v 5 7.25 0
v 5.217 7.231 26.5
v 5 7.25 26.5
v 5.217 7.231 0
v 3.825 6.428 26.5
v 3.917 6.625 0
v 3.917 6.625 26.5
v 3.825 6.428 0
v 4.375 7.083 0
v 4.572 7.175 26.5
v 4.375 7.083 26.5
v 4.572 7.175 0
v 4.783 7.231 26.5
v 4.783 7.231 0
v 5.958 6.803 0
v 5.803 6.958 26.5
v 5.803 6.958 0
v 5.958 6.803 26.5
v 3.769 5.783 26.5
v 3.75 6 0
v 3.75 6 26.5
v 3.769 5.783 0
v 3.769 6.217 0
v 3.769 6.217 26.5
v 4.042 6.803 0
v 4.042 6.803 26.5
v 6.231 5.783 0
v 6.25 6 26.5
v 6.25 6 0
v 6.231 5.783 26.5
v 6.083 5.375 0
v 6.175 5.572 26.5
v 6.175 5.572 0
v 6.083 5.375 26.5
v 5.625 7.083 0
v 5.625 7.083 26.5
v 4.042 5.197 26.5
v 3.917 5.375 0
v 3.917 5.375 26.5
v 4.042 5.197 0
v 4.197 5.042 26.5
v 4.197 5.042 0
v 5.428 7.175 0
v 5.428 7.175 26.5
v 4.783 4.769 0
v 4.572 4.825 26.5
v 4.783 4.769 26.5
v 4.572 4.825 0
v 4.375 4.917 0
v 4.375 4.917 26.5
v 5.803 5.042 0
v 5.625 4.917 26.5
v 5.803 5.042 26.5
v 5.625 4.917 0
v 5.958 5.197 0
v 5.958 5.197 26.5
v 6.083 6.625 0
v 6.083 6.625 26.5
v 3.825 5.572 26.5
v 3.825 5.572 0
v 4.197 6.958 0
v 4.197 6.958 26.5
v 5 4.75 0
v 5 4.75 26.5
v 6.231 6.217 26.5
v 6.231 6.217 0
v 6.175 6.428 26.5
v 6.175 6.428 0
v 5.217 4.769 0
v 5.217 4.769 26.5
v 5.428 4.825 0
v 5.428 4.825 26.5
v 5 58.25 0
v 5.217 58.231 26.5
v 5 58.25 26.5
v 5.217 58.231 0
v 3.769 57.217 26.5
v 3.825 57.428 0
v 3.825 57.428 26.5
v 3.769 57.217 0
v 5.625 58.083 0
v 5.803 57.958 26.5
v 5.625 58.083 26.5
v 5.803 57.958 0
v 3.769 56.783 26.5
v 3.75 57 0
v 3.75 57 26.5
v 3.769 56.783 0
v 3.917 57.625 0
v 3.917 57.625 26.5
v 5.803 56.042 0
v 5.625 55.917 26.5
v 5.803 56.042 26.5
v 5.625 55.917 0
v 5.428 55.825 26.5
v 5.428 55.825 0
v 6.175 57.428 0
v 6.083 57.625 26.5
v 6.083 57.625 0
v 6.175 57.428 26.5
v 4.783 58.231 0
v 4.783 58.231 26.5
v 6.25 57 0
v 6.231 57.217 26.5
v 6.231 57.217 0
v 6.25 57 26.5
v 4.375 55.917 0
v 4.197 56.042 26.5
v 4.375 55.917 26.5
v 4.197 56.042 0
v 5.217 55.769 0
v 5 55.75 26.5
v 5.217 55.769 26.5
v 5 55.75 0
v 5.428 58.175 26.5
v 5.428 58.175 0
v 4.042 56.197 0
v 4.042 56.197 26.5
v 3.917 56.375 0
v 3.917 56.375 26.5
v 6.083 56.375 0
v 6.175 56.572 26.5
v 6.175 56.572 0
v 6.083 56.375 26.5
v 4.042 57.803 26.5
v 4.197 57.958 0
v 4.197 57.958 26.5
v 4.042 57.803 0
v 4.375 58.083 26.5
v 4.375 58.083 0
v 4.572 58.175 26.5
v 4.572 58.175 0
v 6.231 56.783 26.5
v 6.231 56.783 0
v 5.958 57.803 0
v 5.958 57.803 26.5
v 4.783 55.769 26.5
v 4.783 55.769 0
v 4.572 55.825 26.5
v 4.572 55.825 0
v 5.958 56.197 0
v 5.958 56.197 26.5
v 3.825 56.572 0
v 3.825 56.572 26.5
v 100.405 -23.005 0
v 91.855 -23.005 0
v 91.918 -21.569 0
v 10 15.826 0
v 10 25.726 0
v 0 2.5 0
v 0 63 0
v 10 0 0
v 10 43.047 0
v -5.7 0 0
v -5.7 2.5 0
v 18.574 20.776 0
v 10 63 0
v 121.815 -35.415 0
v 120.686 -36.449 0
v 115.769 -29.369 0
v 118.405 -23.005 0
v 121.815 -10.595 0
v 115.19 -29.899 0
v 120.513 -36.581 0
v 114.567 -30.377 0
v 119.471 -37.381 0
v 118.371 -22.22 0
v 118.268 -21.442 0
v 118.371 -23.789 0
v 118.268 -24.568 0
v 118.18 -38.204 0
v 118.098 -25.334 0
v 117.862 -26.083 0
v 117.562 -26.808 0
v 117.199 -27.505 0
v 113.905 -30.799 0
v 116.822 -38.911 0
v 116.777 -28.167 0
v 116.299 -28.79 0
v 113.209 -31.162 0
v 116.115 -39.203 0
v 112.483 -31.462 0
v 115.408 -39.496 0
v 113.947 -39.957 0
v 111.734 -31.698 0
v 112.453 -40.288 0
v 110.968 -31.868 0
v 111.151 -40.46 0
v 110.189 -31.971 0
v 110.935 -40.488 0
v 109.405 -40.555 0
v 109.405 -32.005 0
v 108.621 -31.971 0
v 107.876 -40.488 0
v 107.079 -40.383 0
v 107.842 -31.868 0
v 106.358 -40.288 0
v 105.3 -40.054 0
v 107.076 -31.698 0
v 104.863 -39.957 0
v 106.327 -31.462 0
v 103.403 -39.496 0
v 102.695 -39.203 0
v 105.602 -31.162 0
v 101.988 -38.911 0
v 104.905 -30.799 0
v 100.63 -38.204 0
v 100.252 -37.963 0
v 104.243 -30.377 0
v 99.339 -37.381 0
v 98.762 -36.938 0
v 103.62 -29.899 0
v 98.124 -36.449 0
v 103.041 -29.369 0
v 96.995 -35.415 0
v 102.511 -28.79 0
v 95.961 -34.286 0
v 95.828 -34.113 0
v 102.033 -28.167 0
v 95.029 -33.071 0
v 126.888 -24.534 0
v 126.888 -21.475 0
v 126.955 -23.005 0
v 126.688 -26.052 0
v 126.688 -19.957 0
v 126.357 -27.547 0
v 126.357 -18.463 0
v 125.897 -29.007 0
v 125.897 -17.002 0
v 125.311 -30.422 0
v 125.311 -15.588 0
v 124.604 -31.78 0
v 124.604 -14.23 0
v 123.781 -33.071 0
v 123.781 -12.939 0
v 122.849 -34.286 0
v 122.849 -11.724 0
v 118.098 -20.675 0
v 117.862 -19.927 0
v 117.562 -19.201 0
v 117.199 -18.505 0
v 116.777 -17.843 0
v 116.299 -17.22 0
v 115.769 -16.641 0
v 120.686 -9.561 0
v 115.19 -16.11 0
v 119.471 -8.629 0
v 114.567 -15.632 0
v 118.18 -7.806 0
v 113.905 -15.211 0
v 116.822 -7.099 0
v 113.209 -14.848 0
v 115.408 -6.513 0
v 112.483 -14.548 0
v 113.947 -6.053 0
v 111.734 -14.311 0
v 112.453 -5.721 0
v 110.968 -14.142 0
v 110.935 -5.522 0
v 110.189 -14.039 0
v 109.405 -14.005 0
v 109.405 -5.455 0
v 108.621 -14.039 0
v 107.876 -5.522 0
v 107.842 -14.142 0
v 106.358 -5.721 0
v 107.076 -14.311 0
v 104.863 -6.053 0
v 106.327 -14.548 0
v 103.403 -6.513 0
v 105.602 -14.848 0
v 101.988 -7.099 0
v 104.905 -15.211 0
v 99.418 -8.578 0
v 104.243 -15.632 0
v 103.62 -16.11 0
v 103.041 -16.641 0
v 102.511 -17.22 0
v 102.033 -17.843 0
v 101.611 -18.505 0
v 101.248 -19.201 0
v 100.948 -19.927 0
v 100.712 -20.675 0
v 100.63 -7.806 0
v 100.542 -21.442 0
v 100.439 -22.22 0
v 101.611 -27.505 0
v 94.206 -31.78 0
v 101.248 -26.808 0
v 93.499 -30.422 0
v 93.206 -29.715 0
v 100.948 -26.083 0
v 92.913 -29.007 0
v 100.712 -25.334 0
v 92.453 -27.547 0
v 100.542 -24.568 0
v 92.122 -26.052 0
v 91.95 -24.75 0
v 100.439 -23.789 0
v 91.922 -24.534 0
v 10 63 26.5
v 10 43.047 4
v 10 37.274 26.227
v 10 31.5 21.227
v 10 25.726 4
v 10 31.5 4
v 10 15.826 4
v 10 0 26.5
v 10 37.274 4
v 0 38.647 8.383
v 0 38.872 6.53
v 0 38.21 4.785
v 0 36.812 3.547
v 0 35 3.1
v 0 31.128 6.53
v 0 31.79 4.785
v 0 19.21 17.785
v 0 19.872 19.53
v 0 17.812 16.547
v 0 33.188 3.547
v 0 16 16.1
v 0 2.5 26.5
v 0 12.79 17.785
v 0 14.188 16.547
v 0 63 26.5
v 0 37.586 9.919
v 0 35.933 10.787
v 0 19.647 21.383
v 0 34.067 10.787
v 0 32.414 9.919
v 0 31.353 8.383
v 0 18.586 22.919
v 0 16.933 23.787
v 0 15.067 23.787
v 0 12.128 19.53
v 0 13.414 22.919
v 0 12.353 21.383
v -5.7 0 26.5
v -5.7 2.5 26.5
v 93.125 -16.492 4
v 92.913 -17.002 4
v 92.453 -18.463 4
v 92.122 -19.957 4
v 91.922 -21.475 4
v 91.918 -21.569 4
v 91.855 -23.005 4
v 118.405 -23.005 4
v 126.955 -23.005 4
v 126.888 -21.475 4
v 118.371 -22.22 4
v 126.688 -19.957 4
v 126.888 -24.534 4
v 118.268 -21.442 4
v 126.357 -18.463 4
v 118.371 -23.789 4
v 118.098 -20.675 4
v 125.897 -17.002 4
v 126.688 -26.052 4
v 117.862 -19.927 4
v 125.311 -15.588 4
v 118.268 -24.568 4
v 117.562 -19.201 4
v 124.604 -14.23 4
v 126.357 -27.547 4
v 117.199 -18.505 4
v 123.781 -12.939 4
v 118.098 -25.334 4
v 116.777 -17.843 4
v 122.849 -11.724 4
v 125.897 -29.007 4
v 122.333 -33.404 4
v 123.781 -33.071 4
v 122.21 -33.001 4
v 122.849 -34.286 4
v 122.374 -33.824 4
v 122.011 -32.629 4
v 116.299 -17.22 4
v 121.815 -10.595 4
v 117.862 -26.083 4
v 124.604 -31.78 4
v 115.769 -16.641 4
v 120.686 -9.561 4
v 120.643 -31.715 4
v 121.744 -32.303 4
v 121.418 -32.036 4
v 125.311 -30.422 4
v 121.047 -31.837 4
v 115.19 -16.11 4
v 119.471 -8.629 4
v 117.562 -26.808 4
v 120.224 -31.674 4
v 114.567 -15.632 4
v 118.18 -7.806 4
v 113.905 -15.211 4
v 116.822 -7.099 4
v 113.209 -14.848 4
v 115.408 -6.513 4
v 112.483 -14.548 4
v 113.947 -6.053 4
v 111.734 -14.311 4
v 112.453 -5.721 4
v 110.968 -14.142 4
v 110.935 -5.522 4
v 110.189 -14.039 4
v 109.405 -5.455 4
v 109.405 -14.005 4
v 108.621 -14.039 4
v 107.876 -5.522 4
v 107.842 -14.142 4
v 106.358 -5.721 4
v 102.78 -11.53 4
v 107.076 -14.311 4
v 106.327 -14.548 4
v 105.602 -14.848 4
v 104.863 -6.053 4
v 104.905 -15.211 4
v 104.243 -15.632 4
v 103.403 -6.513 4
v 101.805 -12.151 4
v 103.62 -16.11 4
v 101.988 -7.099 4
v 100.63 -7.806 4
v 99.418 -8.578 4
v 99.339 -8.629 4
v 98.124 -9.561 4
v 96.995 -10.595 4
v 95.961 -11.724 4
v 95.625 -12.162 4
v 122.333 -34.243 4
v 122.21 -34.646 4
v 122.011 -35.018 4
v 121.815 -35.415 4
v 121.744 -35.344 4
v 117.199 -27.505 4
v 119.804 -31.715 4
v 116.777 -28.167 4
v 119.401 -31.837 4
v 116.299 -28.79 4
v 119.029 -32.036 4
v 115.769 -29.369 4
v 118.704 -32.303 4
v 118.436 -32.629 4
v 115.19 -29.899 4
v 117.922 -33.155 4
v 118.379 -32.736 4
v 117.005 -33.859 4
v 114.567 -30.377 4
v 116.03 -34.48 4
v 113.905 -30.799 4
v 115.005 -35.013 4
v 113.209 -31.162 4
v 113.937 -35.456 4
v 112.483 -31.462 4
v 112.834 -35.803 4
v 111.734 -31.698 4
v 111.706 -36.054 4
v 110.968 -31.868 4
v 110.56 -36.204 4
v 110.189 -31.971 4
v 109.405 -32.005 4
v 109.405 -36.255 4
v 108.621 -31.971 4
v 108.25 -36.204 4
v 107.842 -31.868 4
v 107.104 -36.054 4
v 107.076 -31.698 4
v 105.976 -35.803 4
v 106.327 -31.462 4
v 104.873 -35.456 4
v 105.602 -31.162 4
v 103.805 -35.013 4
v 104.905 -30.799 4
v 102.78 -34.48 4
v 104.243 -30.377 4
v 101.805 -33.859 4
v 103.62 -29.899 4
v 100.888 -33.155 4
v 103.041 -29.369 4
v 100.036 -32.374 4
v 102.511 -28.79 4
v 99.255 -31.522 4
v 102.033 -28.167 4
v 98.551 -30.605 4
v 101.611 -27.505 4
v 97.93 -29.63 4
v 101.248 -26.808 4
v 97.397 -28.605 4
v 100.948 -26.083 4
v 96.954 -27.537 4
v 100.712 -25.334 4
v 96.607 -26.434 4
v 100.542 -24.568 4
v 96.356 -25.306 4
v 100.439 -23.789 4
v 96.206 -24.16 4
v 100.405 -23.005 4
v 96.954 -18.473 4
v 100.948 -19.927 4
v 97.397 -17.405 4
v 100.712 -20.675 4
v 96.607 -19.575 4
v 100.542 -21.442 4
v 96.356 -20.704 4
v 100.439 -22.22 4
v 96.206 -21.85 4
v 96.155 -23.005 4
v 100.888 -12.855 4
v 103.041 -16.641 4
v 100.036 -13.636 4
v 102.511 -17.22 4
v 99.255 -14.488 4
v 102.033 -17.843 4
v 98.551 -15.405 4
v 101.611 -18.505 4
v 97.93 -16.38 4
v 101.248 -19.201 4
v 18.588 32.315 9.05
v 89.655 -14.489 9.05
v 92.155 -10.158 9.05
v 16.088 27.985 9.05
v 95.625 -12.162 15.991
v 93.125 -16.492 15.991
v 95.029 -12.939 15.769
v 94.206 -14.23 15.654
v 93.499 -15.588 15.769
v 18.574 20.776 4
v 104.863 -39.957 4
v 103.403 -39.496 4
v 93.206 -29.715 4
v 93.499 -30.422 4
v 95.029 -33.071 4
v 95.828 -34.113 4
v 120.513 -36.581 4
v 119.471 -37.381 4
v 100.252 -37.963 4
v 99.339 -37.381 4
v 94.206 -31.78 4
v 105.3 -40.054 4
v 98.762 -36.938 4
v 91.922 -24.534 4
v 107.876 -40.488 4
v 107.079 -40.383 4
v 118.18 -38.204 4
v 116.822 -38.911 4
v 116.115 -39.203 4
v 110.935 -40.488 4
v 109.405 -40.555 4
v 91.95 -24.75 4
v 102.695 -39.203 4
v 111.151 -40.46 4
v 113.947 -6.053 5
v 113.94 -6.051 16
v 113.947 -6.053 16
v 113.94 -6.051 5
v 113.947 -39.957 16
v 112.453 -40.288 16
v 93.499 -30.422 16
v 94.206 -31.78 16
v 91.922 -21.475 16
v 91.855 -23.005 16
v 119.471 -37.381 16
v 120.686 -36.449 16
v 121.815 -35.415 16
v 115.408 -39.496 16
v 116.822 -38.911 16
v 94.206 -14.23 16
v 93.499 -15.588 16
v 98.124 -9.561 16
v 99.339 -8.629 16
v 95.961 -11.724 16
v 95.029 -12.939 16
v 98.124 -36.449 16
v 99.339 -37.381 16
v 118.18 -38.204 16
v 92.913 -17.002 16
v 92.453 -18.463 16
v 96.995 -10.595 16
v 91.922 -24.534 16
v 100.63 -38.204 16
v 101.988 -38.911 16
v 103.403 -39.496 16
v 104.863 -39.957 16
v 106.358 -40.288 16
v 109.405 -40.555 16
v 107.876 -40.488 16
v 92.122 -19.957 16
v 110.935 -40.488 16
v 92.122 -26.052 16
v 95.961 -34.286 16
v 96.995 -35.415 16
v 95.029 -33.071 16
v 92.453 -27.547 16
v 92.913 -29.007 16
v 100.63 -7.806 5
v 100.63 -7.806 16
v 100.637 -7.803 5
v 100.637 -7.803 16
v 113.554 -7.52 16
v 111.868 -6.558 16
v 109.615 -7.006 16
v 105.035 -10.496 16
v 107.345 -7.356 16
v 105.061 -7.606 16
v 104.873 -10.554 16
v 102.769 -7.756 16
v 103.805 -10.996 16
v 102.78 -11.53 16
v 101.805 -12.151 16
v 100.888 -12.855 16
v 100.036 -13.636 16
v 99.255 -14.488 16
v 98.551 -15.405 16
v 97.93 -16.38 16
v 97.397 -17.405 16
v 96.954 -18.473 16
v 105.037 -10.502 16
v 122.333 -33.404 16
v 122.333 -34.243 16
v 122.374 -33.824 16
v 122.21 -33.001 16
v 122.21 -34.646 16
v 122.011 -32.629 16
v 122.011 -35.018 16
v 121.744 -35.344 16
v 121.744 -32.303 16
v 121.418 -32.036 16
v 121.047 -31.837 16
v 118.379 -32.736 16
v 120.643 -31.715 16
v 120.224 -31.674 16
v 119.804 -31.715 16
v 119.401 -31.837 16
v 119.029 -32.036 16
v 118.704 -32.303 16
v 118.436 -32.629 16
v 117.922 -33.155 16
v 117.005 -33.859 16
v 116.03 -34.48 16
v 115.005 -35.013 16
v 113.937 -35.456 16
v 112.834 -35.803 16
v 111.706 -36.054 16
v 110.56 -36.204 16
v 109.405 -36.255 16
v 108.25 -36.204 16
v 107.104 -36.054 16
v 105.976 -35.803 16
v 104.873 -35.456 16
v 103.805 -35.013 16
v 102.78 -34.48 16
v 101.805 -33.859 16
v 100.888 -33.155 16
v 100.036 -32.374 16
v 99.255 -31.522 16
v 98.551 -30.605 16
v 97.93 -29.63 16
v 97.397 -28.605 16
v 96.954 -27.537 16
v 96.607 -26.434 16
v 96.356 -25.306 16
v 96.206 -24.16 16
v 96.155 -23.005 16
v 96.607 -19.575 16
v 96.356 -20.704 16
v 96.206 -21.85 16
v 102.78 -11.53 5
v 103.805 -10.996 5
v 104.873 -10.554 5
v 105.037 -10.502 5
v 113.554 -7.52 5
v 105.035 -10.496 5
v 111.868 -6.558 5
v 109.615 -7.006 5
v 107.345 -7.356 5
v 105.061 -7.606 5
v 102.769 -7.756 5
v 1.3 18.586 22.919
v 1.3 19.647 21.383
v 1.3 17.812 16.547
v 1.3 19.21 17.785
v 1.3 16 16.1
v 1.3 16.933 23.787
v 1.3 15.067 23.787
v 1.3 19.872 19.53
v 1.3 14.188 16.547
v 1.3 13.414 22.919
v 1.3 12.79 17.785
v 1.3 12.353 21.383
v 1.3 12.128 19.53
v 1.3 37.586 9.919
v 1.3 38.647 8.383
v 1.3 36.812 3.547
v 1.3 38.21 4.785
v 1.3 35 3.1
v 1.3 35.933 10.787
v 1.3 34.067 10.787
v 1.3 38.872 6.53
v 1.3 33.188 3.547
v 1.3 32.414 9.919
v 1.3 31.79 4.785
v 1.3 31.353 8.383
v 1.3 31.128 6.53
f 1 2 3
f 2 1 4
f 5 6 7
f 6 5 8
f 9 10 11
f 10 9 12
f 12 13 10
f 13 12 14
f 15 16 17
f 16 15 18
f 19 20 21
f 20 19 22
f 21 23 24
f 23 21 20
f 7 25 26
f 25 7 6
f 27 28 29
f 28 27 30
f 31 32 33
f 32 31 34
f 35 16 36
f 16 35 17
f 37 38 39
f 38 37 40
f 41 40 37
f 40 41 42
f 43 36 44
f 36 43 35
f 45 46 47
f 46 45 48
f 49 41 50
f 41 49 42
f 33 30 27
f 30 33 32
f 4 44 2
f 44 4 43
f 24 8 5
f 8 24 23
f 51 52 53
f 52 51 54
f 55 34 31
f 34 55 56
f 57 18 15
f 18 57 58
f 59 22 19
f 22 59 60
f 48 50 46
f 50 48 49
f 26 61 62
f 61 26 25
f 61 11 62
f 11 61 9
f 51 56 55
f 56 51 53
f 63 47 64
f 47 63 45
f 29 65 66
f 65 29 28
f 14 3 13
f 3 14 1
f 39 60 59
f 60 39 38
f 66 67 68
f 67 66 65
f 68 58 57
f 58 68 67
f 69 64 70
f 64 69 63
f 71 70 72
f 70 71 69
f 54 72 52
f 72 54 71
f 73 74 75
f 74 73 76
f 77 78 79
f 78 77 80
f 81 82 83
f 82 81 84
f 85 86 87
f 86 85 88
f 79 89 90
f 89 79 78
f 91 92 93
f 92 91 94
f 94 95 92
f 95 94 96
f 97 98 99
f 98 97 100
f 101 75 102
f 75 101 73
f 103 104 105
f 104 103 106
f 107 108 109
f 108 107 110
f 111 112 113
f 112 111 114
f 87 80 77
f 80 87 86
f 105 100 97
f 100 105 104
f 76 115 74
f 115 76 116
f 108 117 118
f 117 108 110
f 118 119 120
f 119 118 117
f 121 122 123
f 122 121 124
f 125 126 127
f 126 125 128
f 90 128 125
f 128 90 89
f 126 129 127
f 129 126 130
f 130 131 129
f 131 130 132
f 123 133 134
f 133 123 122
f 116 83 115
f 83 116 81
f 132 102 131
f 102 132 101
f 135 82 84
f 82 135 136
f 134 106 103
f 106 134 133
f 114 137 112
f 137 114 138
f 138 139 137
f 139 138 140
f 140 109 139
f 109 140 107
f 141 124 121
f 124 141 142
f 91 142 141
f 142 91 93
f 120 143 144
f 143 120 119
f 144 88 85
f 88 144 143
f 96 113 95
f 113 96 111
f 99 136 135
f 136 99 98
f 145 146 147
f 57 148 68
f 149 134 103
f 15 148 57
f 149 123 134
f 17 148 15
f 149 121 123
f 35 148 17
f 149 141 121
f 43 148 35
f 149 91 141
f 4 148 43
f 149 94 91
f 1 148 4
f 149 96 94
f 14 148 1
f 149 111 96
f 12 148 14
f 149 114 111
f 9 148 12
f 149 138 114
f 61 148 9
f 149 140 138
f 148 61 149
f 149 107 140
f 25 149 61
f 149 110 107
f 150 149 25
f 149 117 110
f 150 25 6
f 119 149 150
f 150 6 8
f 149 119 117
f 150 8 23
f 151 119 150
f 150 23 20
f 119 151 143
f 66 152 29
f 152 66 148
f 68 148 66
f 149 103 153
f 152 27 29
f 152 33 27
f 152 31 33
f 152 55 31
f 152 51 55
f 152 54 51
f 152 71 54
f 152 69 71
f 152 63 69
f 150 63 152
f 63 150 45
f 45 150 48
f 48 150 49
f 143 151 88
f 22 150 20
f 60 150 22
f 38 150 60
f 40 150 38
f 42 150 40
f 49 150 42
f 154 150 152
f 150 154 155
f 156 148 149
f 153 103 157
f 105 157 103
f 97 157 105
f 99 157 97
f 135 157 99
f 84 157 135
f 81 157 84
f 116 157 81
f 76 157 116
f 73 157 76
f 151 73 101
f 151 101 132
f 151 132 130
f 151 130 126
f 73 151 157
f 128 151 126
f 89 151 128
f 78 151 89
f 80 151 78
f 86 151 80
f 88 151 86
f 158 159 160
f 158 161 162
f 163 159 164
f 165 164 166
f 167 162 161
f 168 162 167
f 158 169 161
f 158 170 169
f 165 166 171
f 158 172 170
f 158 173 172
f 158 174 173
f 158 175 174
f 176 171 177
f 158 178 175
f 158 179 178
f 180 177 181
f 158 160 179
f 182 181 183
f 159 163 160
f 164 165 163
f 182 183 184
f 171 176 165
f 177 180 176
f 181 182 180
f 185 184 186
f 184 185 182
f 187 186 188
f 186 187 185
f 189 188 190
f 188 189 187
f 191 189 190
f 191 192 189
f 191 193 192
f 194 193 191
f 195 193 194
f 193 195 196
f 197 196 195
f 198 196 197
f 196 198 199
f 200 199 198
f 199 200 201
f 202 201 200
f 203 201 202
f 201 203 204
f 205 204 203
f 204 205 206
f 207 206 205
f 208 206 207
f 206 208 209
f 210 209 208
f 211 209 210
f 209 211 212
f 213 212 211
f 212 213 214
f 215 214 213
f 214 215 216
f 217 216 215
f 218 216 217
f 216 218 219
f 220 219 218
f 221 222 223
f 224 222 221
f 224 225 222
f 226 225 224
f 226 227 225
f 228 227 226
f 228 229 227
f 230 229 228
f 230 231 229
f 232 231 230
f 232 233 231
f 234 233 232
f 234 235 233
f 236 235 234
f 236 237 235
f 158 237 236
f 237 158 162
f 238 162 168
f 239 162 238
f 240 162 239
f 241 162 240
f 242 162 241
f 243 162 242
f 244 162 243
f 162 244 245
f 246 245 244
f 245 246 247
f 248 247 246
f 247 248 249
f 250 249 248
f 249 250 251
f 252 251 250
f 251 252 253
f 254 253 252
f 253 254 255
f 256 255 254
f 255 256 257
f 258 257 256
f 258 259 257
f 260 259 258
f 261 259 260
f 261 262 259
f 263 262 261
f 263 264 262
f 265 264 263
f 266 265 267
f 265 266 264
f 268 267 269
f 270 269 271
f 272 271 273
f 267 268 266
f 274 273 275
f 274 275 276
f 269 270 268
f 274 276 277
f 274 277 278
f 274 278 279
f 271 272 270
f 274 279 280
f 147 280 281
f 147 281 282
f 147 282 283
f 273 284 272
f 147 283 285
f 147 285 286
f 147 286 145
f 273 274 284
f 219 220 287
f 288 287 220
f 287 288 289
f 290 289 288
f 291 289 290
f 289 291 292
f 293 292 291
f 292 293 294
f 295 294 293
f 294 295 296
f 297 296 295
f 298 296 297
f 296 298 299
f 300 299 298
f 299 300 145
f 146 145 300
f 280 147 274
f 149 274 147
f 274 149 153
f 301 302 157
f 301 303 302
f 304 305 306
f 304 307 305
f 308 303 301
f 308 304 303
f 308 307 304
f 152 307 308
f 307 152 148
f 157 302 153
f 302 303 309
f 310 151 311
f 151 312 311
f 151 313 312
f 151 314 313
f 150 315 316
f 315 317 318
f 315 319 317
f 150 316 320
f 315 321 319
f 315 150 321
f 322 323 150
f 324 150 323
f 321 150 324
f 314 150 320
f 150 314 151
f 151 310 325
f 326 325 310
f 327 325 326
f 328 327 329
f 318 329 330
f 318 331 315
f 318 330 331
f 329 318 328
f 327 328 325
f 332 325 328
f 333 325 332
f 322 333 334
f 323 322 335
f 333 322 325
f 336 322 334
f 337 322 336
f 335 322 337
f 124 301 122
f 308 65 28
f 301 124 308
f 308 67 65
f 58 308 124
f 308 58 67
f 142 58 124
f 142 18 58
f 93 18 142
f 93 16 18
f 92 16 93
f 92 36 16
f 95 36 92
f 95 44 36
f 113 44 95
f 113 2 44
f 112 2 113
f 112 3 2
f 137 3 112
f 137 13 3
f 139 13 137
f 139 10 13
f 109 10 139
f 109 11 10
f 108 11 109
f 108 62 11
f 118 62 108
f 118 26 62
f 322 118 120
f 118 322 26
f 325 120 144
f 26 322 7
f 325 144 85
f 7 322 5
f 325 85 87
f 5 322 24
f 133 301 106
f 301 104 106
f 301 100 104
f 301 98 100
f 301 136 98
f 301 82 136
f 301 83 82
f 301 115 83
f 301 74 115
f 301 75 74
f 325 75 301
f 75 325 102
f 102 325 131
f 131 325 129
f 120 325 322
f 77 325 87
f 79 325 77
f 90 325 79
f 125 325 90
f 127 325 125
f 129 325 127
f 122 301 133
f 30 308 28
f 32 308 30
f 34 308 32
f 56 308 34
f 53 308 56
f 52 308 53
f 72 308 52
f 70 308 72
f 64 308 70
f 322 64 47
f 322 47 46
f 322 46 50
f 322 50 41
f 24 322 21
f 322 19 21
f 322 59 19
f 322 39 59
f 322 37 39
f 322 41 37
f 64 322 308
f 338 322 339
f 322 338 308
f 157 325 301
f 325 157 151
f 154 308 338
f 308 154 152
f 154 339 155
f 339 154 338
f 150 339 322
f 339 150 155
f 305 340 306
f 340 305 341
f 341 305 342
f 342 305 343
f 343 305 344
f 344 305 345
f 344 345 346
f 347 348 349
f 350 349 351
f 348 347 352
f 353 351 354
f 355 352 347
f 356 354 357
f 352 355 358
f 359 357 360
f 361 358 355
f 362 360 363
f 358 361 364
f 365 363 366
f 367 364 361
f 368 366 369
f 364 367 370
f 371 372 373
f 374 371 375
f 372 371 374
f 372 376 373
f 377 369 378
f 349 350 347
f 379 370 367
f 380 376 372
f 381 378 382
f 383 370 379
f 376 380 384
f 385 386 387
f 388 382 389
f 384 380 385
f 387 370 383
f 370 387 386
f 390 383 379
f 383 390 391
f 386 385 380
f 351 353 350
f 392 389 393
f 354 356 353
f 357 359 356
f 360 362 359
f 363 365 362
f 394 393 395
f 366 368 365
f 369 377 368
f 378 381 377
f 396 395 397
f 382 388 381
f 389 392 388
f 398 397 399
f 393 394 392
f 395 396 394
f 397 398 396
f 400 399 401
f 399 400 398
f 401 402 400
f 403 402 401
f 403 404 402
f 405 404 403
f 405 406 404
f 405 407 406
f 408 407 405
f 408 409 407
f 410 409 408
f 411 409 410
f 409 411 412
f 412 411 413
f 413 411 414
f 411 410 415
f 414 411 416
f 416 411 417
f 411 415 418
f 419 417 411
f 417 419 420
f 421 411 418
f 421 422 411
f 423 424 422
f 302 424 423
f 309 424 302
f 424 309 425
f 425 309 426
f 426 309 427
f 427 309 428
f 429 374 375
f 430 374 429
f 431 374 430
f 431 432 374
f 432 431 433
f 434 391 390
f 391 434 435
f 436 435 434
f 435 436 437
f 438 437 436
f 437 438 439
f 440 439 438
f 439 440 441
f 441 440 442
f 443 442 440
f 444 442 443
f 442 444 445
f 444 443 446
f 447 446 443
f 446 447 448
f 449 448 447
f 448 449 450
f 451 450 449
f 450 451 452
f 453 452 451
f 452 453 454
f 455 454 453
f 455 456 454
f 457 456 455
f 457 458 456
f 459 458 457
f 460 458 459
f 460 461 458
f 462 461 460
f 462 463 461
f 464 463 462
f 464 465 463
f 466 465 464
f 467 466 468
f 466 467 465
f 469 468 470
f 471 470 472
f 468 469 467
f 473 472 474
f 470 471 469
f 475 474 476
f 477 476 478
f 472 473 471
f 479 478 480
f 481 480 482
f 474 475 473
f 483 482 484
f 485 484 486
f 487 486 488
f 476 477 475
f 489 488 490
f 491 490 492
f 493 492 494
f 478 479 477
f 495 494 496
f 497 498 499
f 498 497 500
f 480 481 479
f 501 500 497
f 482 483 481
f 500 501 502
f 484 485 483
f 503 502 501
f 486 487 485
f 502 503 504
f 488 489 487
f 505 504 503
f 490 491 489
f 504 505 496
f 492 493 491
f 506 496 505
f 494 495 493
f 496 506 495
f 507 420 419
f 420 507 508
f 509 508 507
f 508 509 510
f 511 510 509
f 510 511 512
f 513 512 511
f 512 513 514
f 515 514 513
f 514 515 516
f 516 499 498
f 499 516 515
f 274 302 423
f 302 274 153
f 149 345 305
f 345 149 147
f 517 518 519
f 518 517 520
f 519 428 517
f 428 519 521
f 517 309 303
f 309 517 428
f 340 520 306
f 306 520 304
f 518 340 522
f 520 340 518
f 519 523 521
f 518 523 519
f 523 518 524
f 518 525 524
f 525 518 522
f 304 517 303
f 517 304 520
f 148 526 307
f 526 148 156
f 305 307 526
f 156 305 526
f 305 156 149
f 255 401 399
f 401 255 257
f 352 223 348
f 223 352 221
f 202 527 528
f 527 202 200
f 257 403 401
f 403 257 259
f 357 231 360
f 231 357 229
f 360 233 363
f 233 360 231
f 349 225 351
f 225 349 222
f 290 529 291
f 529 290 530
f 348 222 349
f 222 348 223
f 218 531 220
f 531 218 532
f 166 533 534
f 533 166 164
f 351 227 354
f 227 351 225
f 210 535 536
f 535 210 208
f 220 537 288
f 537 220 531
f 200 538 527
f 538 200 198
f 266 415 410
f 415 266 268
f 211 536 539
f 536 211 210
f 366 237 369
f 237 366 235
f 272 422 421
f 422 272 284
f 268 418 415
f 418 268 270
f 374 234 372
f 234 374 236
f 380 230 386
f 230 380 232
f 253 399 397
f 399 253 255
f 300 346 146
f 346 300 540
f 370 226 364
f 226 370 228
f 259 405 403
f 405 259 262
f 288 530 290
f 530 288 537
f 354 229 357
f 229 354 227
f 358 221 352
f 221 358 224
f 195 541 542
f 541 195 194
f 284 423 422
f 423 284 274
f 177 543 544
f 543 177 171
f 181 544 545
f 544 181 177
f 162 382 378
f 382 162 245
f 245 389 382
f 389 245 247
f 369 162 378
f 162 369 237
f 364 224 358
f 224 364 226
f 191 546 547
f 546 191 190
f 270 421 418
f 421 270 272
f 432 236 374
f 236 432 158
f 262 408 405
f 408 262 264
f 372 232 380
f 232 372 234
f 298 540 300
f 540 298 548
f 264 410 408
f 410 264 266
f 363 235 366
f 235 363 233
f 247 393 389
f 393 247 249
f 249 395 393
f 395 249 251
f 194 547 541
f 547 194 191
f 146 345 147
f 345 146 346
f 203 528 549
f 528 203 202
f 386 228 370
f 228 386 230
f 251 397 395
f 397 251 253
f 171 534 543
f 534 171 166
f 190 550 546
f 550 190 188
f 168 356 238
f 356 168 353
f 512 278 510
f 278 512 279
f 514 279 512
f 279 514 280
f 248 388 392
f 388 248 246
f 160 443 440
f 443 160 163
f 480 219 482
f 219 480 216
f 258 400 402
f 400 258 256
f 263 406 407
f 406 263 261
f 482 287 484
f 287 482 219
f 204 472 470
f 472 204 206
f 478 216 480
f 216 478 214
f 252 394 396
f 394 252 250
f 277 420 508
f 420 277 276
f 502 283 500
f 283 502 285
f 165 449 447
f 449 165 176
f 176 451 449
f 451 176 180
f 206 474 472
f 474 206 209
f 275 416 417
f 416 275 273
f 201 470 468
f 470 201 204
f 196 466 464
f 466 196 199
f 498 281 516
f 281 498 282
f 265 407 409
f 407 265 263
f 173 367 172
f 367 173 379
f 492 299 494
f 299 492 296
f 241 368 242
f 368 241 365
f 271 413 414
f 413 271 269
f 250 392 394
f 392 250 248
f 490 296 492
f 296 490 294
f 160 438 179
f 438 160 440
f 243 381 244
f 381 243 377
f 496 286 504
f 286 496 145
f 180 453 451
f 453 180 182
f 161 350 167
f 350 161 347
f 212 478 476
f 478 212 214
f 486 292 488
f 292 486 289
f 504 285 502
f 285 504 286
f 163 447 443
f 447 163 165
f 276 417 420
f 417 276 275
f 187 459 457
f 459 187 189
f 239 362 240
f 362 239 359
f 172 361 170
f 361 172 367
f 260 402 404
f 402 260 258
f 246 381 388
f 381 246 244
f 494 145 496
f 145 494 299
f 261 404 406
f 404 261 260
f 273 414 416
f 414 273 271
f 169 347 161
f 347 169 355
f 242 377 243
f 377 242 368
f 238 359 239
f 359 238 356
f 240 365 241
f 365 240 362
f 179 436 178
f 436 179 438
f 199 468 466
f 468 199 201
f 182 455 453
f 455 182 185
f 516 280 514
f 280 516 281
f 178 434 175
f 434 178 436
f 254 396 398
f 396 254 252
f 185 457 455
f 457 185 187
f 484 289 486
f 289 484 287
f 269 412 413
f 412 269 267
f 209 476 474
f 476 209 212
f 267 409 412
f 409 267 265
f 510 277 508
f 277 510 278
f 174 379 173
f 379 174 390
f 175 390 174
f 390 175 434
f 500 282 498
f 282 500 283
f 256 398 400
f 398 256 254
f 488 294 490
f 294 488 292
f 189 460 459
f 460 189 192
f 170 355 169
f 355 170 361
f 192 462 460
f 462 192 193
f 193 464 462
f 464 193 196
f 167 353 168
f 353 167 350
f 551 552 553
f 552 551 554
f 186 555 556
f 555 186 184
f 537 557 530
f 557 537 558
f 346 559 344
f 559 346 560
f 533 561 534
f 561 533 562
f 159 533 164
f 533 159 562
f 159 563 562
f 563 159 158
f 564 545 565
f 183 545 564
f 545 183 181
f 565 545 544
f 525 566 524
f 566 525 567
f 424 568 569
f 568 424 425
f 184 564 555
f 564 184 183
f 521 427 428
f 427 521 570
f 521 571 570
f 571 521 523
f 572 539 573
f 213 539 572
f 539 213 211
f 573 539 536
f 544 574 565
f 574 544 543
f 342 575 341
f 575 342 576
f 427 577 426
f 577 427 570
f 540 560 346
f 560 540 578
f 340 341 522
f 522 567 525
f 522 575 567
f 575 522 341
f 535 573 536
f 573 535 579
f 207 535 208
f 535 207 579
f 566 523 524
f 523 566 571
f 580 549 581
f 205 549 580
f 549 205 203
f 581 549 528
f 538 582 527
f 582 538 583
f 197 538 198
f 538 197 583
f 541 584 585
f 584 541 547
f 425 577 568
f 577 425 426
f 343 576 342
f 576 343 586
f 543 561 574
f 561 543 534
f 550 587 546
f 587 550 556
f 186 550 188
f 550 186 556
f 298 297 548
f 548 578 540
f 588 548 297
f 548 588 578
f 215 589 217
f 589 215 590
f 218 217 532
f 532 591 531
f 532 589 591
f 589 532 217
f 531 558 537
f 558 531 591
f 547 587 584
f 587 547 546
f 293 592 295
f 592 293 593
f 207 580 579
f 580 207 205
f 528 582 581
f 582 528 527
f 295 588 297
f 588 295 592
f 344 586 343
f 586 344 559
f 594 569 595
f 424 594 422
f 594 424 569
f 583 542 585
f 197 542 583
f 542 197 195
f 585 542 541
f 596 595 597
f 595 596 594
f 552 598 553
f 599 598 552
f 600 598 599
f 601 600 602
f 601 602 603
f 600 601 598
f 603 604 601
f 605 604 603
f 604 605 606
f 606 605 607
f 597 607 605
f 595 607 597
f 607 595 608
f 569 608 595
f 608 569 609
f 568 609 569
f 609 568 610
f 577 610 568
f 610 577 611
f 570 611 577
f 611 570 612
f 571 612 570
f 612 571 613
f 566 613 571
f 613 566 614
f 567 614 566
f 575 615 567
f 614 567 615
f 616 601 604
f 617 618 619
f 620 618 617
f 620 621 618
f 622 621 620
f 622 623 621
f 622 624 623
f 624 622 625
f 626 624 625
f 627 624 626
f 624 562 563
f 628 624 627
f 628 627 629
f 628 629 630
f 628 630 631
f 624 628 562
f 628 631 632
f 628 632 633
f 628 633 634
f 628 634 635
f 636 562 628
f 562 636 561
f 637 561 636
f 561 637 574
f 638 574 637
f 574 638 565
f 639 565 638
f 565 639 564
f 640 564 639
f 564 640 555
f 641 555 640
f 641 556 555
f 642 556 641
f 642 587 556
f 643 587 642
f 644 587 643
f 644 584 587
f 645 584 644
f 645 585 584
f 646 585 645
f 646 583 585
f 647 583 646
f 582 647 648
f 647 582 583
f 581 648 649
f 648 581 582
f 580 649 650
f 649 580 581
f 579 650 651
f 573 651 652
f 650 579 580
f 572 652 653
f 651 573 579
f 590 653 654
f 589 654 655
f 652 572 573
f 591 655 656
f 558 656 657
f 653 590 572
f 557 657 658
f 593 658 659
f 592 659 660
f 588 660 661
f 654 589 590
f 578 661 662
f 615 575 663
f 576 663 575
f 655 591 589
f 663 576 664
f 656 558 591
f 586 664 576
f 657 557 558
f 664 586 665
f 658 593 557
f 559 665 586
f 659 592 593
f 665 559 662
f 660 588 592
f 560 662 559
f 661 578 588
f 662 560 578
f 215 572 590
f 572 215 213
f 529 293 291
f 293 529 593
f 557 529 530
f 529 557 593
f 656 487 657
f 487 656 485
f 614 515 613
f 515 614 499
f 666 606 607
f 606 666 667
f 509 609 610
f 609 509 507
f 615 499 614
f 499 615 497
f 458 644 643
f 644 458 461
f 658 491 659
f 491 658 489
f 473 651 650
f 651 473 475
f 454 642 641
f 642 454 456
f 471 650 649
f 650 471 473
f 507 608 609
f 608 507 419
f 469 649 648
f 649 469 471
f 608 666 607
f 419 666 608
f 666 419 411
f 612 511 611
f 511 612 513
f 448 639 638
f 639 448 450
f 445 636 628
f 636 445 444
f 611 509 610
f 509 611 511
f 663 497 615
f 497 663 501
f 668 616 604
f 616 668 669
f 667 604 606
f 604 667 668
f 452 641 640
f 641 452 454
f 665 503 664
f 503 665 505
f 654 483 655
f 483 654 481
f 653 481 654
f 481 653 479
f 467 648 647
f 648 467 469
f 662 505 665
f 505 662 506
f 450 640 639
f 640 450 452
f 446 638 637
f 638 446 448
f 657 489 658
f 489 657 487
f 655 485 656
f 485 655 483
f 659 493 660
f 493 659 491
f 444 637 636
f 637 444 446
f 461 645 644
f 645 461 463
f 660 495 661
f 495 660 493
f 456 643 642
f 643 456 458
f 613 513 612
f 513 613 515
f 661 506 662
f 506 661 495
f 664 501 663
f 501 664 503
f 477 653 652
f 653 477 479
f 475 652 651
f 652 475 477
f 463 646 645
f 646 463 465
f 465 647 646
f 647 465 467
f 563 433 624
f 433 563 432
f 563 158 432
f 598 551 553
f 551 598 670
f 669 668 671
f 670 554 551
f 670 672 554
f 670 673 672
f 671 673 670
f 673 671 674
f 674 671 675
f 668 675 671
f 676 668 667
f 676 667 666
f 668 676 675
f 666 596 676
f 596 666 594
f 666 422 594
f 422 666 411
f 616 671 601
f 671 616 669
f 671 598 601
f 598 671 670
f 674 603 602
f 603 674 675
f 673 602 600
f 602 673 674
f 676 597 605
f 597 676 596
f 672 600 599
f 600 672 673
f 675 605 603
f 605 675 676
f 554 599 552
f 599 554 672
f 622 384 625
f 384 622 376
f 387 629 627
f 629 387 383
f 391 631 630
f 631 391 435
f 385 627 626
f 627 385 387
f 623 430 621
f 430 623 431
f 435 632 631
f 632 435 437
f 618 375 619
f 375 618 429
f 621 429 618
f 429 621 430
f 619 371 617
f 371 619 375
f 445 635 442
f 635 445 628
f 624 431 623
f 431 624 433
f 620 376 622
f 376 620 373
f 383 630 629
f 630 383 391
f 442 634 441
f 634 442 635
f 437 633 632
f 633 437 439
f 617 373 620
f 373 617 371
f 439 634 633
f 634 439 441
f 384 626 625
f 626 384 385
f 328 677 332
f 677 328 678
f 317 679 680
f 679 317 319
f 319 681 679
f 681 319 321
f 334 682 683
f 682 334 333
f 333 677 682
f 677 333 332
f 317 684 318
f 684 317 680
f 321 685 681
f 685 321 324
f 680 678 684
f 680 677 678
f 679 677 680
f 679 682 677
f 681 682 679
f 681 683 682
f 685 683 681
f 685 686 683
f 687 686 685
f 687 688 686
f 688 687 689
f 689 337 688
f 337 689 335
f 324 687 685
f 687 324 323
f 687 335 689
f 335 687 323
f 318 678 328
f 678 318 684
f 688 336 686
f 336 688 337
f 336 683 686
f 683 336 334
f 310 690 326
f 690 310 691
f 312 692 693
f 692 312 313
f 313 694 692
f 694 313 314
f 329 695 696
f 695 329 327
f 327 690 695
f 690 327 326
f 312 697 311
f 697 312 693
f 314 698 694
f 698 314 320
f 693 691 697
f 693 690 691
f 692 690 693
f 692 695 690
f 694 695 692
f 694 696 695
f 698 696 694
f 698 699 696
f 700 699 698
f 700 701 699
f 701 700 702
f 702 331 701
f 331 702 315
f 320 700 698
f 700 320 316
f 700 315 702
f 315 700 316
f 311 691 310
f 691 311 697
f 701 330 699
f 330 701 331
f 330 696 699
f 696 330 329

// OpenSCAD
// [FL_INDEX: keywords="openscad, 3d_parametric, Customizable_solidoodle_alternative_snap_spool_holder, csg_solid" | COT="Parametric OpenSCAD design from 3DCodeverse"]
// Title: Customizable solidoodle alternative snap spool holder

part = "lt"; // [rt:Right tower,lt:Left tower,orb:Outer right bracket,olb:Outer left bracket,irb:Inner right bracket,ilb:Inner left bracket,rtb:Right tower with bracket,ltb:Left tower with bracket]

// How you plan to mount the holder
positioning = 1; // [0:Anywhere along top frame,1:Flush against back (notched brackets)]

// Extra length for back lip, when positioning is flush against back
back_lip_extra_length = 2; // [0:5]

// Arm length; pipe distance from top of printer is arm_length*cos(arm_angle) - clip_inner_diameter/2
arm_length = 122;  // [110:180]
// Arm inclination (towards back); default 30
arm_angle = 30; // [5:45]

// Length of base
base_size = 63;  // [63:73]

// Inner diameter of pipe clip
clip_inner_diameter = 26.5; // [26.4:.75in pipe (tight),26.7:.75in pipe (exact),33.2:1in pipe (tight),33.4:1in pipe (exact)]
// Thickness of pipe clip; must be smaller or equal to clip head thickness (keep larger than 4)
clip_thickness = 8.6;
// Diameter of clip end hole
clip_head_inner_diameter = 18; // [0:23]
// Clip end rim size
clip_head_rim_thickness = 0; // [0:10]
// Clip lip thickness
clip_edge_thickness = 1.5;
// Clip rotation; you may want to adjust if you change arm_angle (30-arm_angle will keep gap orientation unchanged)
clip_angle = 0; // [-20:30]
// Clip lip curvature multiplier (1 to 3 recommended; higher is less curved)
clip_lip_curvature = 1.5;
// Arm side buttress base width; may want to adjust if you change arm angle
arm_buttress_width = 10; // [3:15]

/* [Hidden] */

back_pos = (positioning != 0);

// Base parameters
base_d = base_size;
base_h = 10;
base_w = 26.5;
screw_r = 1.25;
screw_dist = 51;

// Arm parameters
arm_len = arm_length;
arm_thk = 4;
arm_w = 15;
arm_rib = 5;
//arm_angle = 30;
arm_butt_w = arm_buttress_width;


// Clip parameters
clip_h = 4;
clip_od = clip_inner_diameter + clip_thickness + clip_head_rim_thickness;
clip_id = clip_head_inner_diameter;
lip_h = 16;  // includes clip_h
lip_od = clip_inner_diameter + clip_thickness;
lip_id = clip_inner_diameter;
lip_edge_thk = clip_edge_thickness;
lip_phi = 120;
lip_dphi = 75 + clip_angle;
lip_gap_phi = 45;
lip_gap_dphi = lip_dphi - lip_gap_phi;
lip_gap_h = 1;
lip_shave_r = lip_od*clip_lip_curvature;

// Solidoodle frame
sd_slack = 0.2;
sd_frame_thk = 1 + sd_slack;   // sheet metal
sd_toph_w = 26 + sd_slack;  // horizontal
sd_backv_w = 45.5 + sd_slack;  // vertical

rivet_r = 6.3/2 + 0.75;
rivet_h = 1 + 0.3;

// Bracket parameters
bracket_len = base_d;
bracket_thk = 2.5;
bracket_screw_r = 1.75;
bracket_screw_head_r = 2.75;
bracket_screw_head_h = 1.25;
bracket_screw_hole_dist = screw_dist;
bracket_screw_hole_ofs = 5;

// Extra
back_lip_len = bracket_thk + sd_frame_thk + back_lip_extra_length;  // same as inner bracket width

// phi <= 180
module cylinder_hollow(h, od, id, phi, d_phi=0) {
  rotate([0,0,d_phi]) difference() {
    cylinder(h, od/2, od/2, $fn=72);
    translate([0,0,-0.1]) cylinder(h+0.2, id/2, id/2, $fn=72);
    if (phi != 0) {
      translate([0,0,-0.1]) linear_extrude(height=h+0.2, twist=0) polygon([[0,0], [od,0], [cos(phi/2)*od, sin(phi/2)*od], [cos(phi)*od, sin(phi)*od]], convexity=2);
    }
  }
}

// phi <= 180
module cylinder_hollow_n(h, od, id, phi, d_phi=0) {
  rotate([0,0,d_phi]) intersection() {
    difference() {
      cylinder(h, od/2, od/2, $fn=72);
      translate([0,0,-0.1]) cylinder(h+0.2, id/2, id/2, $fn=72);
    }
    translate([0,0,-0.1]) linear_extrude(height=h+0.2, twist=0) polygon([[0,0], [od,0], [cos(phi/2)*od, sin(phi/2)*od], [cos(phi)*od, sin(phi)*od]], convexity=2);
  }
}

module buttress_w(thk, w, phi) {
  h = w*tan(phi);
  linear_extrude(height=thk, twist=0) polygon([[0,0],[w,0],[w,h]], convexity=2);
}

module buttress_h(thk, h, phi) {
  w = h/tan(phi);
  linear_extrude(height=thk, twist=0) polygon([[0,0],[w,0],[w,h]], convexity=2);
}




module base(lt_holes=true, rt_holes=true) {
  difference() {
    cube([base_w, base_d, base_h]);
    if (rt_holes) {
      translate([-1, (base_d-screw_dist)/2, base_h/2]) rotate([0,90,0]) cylinder(base_w/2+1+1,screw_r,screw_r, $fn=36);
      translate([-1, (base_d+screw_dist)/2, base_h/2]) rotate([0,90,0]) cylinder(base_w/2+1+1,screw_r,screw_r, $fn=36);
    }
    if (lt_holes) {
      translate([-1+base_w/2, (base_d-screw_dist)/2, base_h/2]) rotate([0,90,0]) cylinder(base_w/2+1+1,screw_r,screw_r, $fn=36);
      translate([-1+base_w/2, (base_d+screw_dist)/2, base_h/2]) rotate([0,90,0]) cylinder(base_w/2+1+1,screw_r,screw_r, $fn=36);
    }
    *union() {  // Test print only 
      translate([-1, -base_d/2-2.5, 0]) cube([base_w, base_d, base_h]);
      translate([-1, base_d/2+2.5, 0]) cube([base_w, base_d, base_h]);
    }
  }
  if (back_pos) {
    translate([0,0,-back_lip_len]) cube([base_w, bracket_thk, back_lip_len+base_h]);
  }
}

module arm(left=0) {
  sb = left;
  ss = 1 - 2*sb;
  l = arm_len - sqrt(clip_od*clip_od - arm_w*arm_w)/2 + 0.2;
  union() {
    // Main
    cube([arm_thk, arm_w, l]);
    // Reinforcement
    translate([-sb*arm_rib + ss*0.05, (arm_w-arm_rib)/2, 0]) cube([arm_thk+arm_rib,arm_rib, l]);
    // Clip buttress
    translate([ss*lip_h + sb*arm_thk, (arm_w+ss*arm_rib)/2, arm_len-lip_od/2+0.2]) rotate([-90,0,(1-sb)*180]) buttress_w(arm_rib,lip_h-arm_rib-arm_thk, 30);
    // Side buttress
    translate([ss*(base_w - 0.1) + sb*arm_thk, (arm_w-ss*arm_rib)/2, base_h/cos(arm_angle)-tan(arm_angle)*(arm_w+arm_rib)/2 - 0.1]) rotate([-90, 180, sb*180]) buttress_w(arm_rib, base_w-arm_rib-arm_thk, 30);
    // Back buttress
    translate([arm_thk,0,base_h/cos(arm_angle)-0.1]) rotate([90,-arm_angle,-90]) linear_extrude(height=arm_thk, twist=0) polygon([[0,0],[arm_butt_w,0],[0.5*arm_butt_w,0.5*arm_butt_w*tan(90-arm_angle)]], convexity=2);
  }
}

module clip(left=0) {
  sb = left;  // 0,1
  ss = 1 - 2*sb;  // 0,1 -> 1,-1
  union() {
    cylinder_hollow(clip_h,clip_od,clip_id,0);
    translate([0,0,-sb*(lip_h-clip_h)]) difference() {
      cylinder_hollow(lip_h, lip_od, lip_id, lip_phi, lip_dphi);
      translate([0,0,sb*(lip_h-clip_h-lip_gap_h)]) cylinder_hollow_n(clip_h+lip_gap_h, lip_od+1, lip_id-1, lip_gap_phi+1, lip_gap_dphi);
      translate([0,0,ss*0.1]) rotate([0,0,lip_dphi-acos((lip_id/2)/(lip_od/2-lip_edge_thk))+0.1]) linear_extrude(height=lip_h+0.2, twist=0) polygon([[0,0], [lip_id/2,0], [lip_id/2, sqrt(pow(lip_od/2-lip_edge_thk,2)-pow(lip_id/2,2))]], convexity=2);
      translate([0,0,ss*0.1]) rotate([0,0,lip_dphi-lip_gap_phi/2]) translate([0.5*lip_od*cos(lip_gap_phi/2)+lip_shave_r*sqrt(1-pow(0.5*sin(lip_gap_phi/2)*lip_od/lip_shave_r,2)), 0, 0]) cylinder(lip_h+0.2, lip_shave_r, lip_shave_r, $fn=144);
    }
    translate([0,0,-sb*(lip_h-clip_h)]) union() {
      rotate([0,0,lip_phi+lip_dphi]) translate([(lip_id+lip_od)/4-0.1,0,0]) cylinder(lip_h, (lip_od-lip_id)/4, (lip_od-lip_id)/4, $fn=32);
      %rotate([0,0, lip_dphi]) translate([(lip_od-lip_edge_thk)/2-0.03, 0, 0]) cylinder(lip_h, lip_edge_thk/2, lip_edge_thk/2, $fn=32);
      // Extra support
      // TODO: radial offset not properly parameterized
      *rotate([0,0, lip_dphi - lip_gap_phi/2]) translate([(lip_od-4*lip_edge_thk)/2, 0, 0]) cylinder(lip_h, lip_edge_thk/2, lip_edge_thk/2, $fn=32);
    }
  }
}

module tower(left=0, lt_holes=true, rt_holes=true) {
  sb = left;  // 0,1
  ss = 1 - 2*sb;  // 0,1 -> 1,-1
  difference() {
    union() {  
      base(lt_holes, rt_holes);
      // Arm and clip assembly
      translate([sb*(base_w-arm_thk), base_d/2, 0]) rotate([arm_angle,0,0]) union() {
        arm(left);
        translate([0, arm_w/2, arm_len]) rotate([0, 90, 0]) clip(left);
      }
    }
    if (back_pos) {
      if (left == 0) {
        translate([0,bracket_thk,-1] + [20,13.5,0]) cylinder(r=rivet_r, h=rivet_h+1);
        translate([0,bracket_thk,-1] + [7,32.5,0]) cylinder(r=rivet_r, h=rivet_h+1);
      } else {
        translate([base_w,bracket_thk,-1]+[-20,13.5,0]) cylinder(r=rivet_r, h=rivet_h+1);
        translate([base_w,bracket_thk,-1]+[-7,32.5,0]) cylinder(r=rivet_r, h=rivet_h+1);
      }
    }
  }
}


module bracket_screw_hole() {
  union() {
    cylinder(bracket_thk+1, bracket_screw_r, bracket_screw_r, $fn=18);
    cylinder(bracket_screw_head_h, bracket_screw_head_r, bracket_screw_r, $fn=18);
    translate([0,0,-1+0.05]) cylinder(1, bracket_screw_head_r, bracket_screw_head_r, $fn=18);
  }
}

module bracket(inner = 0, left=0, holes=true) {
  bb = back_pos ? 1 : 0;
  bracket_w = base_h + bracket_thk + inner*sd_frame_thk + (1-inner)*sd_toph_w;
  difference() {
    union() {
      cube([bracket_w, bracket_thk, bracket_len]);
      translate([bracket_w-bracket_thk,0,bb*(inner*(1-left) + (1-inner)*left)*(sd_backv_w+bracket_thk)]) cube([bracket_thk, 2*bracket_thk, bracket_len-bb*(sd_backv_w+bracket_thk)]);
echo(bracket_len-bb*(sd_backv_w+bracket_thk));
      if (back_pos) {
        if (inner == 0) {
          translate([base_h+back_lip_len,0,(1-left)*(bracket_len-bracket_thk)]) cube([bracket_w-base_h-back_lip_len,bracket_thk+back_lip_len,bracket_thk]);
        } else {
          translate([0,0,left*(bracket_len-bracket_thk)]) cube([base_h+back_lip_len,bracket_thk,bracket_thk]);
        }
      }
    }
    if (holes) {
      translate([bracket_screw_hole_ofs, 0, (bracket_len-bracket_screw_hole_dist)/2]) rotate([-90,0,0]) bracket_screw_hole();
      translate([bracket_screw_hole_ofs, 0, (bracket_len+bracket_screw_hole_dist)/2]) rotate([-90,0,0]) bracket_screw_hole();
    }
    if (back_pos && (inner != 0)) {
      translate([base_h,0,bracket_thk+left*(bracket_len-sd_backv_w-2*bracket_thk)]) cube([bracket_w-base_h, bracket_thk,sd_backv_w]);
    }
    if (back_pos && (inner == 0)) {
      if (left == 0) {
        translate([base_h,bracket_thk+1,bracket_len-bracket_thk] + [6.75,0,-38.5]) rotate([90,0,0]) cylinder(r=rivet_r, h=rivet_h+1);
        translate([base_h,bracket_thk+1,bracket_len-bracket_thk] + [19.75,0,-13.5]) rotate([90,0,0]) cylinder(r=rivet_r, h=rivet_h+1);
      } else {
        translate([base_h,bracket_thk+1,bracket_thk] + [6.75,0,38.5]) rotate([90,0,0]) cylinder(r=rivet_r, h=rivet_h+1);
        translate([base_h,bracket_thk+1,bracket_thk] + [19.75,0,13.5]) rotate([90,0,0]) cylinder(r=rivet_r, h=rivet_h+1);
      }
    }
  }
}


module main(part="rt") {
  if (part == "rt") {
    rotate([0,-90,0]) tower(0);
  } else if (part == "lt") {
    translate([0, 0, base_w]) rotate([0, 90, 0]) tower(1);
  } else if (part == "rtb") {
    rotate([0,-90,0]) union() {
      tower(0,rt_holes=false);
      translate([-bracket_thk,base_d,base_h]) rotate([0,90,-90]) bracket(0,0,holes=false);
    }
  } else if (part == "ltb") {  
    translate([0, 0, base_w]) rotate([0, 90, 0]) union() {
      tower(1,lt_holes=false);
      translate([base_w+bracket_thk,0,base_h]) rotate([0,90,90]) bracket(0,1,holes=false);
    }
  } else if (part == "orb") {
    rotate([90, 0, 0]) bracket(0,0);
  } else if (part == "irb") {
    rotate([90, 0, 0]) bracket(1,0);
  } else if (part == "olb") {
    rotate([90, 0, 0]) bracket(0,1);
  } else if (part == "ilb") {
    rotate([90, 0, 0]) bracket(1,1);
  } else if (part == "dbgr") {  // Debug right
    tower(0);
    # translate([base_w+bracket_thk,0,base_h]) rotate([90,90,180]) bracket(1,0);
    # translate([-bracket_thk,base_d,base_h]) rotate([90,90,0]) bracket(0,0);
  } else if (part == "dbgl") {
    tower(1);
    # translate([base_w+bracket_thk,0,base_h]) rotate([90,90,180]) bracket(0,1);
    # translate([-bracket_thk,base_d,base_h]) rotate([90,90,0]) bracket(1,1);
  } else if (part == "dbginset") {
    rotate([0,-90,0]) difference() {
      tower(0, false, false);
      translate([-1,-base_d-1,base_h/3]) cube([base_w+2,2*base_d+2,1.5*arm_length+2]);
      translate([-1,45-1,-1]) cube([base_w+2,base_d+2,arm_length+2]);
    }
  }
}

main(part);
